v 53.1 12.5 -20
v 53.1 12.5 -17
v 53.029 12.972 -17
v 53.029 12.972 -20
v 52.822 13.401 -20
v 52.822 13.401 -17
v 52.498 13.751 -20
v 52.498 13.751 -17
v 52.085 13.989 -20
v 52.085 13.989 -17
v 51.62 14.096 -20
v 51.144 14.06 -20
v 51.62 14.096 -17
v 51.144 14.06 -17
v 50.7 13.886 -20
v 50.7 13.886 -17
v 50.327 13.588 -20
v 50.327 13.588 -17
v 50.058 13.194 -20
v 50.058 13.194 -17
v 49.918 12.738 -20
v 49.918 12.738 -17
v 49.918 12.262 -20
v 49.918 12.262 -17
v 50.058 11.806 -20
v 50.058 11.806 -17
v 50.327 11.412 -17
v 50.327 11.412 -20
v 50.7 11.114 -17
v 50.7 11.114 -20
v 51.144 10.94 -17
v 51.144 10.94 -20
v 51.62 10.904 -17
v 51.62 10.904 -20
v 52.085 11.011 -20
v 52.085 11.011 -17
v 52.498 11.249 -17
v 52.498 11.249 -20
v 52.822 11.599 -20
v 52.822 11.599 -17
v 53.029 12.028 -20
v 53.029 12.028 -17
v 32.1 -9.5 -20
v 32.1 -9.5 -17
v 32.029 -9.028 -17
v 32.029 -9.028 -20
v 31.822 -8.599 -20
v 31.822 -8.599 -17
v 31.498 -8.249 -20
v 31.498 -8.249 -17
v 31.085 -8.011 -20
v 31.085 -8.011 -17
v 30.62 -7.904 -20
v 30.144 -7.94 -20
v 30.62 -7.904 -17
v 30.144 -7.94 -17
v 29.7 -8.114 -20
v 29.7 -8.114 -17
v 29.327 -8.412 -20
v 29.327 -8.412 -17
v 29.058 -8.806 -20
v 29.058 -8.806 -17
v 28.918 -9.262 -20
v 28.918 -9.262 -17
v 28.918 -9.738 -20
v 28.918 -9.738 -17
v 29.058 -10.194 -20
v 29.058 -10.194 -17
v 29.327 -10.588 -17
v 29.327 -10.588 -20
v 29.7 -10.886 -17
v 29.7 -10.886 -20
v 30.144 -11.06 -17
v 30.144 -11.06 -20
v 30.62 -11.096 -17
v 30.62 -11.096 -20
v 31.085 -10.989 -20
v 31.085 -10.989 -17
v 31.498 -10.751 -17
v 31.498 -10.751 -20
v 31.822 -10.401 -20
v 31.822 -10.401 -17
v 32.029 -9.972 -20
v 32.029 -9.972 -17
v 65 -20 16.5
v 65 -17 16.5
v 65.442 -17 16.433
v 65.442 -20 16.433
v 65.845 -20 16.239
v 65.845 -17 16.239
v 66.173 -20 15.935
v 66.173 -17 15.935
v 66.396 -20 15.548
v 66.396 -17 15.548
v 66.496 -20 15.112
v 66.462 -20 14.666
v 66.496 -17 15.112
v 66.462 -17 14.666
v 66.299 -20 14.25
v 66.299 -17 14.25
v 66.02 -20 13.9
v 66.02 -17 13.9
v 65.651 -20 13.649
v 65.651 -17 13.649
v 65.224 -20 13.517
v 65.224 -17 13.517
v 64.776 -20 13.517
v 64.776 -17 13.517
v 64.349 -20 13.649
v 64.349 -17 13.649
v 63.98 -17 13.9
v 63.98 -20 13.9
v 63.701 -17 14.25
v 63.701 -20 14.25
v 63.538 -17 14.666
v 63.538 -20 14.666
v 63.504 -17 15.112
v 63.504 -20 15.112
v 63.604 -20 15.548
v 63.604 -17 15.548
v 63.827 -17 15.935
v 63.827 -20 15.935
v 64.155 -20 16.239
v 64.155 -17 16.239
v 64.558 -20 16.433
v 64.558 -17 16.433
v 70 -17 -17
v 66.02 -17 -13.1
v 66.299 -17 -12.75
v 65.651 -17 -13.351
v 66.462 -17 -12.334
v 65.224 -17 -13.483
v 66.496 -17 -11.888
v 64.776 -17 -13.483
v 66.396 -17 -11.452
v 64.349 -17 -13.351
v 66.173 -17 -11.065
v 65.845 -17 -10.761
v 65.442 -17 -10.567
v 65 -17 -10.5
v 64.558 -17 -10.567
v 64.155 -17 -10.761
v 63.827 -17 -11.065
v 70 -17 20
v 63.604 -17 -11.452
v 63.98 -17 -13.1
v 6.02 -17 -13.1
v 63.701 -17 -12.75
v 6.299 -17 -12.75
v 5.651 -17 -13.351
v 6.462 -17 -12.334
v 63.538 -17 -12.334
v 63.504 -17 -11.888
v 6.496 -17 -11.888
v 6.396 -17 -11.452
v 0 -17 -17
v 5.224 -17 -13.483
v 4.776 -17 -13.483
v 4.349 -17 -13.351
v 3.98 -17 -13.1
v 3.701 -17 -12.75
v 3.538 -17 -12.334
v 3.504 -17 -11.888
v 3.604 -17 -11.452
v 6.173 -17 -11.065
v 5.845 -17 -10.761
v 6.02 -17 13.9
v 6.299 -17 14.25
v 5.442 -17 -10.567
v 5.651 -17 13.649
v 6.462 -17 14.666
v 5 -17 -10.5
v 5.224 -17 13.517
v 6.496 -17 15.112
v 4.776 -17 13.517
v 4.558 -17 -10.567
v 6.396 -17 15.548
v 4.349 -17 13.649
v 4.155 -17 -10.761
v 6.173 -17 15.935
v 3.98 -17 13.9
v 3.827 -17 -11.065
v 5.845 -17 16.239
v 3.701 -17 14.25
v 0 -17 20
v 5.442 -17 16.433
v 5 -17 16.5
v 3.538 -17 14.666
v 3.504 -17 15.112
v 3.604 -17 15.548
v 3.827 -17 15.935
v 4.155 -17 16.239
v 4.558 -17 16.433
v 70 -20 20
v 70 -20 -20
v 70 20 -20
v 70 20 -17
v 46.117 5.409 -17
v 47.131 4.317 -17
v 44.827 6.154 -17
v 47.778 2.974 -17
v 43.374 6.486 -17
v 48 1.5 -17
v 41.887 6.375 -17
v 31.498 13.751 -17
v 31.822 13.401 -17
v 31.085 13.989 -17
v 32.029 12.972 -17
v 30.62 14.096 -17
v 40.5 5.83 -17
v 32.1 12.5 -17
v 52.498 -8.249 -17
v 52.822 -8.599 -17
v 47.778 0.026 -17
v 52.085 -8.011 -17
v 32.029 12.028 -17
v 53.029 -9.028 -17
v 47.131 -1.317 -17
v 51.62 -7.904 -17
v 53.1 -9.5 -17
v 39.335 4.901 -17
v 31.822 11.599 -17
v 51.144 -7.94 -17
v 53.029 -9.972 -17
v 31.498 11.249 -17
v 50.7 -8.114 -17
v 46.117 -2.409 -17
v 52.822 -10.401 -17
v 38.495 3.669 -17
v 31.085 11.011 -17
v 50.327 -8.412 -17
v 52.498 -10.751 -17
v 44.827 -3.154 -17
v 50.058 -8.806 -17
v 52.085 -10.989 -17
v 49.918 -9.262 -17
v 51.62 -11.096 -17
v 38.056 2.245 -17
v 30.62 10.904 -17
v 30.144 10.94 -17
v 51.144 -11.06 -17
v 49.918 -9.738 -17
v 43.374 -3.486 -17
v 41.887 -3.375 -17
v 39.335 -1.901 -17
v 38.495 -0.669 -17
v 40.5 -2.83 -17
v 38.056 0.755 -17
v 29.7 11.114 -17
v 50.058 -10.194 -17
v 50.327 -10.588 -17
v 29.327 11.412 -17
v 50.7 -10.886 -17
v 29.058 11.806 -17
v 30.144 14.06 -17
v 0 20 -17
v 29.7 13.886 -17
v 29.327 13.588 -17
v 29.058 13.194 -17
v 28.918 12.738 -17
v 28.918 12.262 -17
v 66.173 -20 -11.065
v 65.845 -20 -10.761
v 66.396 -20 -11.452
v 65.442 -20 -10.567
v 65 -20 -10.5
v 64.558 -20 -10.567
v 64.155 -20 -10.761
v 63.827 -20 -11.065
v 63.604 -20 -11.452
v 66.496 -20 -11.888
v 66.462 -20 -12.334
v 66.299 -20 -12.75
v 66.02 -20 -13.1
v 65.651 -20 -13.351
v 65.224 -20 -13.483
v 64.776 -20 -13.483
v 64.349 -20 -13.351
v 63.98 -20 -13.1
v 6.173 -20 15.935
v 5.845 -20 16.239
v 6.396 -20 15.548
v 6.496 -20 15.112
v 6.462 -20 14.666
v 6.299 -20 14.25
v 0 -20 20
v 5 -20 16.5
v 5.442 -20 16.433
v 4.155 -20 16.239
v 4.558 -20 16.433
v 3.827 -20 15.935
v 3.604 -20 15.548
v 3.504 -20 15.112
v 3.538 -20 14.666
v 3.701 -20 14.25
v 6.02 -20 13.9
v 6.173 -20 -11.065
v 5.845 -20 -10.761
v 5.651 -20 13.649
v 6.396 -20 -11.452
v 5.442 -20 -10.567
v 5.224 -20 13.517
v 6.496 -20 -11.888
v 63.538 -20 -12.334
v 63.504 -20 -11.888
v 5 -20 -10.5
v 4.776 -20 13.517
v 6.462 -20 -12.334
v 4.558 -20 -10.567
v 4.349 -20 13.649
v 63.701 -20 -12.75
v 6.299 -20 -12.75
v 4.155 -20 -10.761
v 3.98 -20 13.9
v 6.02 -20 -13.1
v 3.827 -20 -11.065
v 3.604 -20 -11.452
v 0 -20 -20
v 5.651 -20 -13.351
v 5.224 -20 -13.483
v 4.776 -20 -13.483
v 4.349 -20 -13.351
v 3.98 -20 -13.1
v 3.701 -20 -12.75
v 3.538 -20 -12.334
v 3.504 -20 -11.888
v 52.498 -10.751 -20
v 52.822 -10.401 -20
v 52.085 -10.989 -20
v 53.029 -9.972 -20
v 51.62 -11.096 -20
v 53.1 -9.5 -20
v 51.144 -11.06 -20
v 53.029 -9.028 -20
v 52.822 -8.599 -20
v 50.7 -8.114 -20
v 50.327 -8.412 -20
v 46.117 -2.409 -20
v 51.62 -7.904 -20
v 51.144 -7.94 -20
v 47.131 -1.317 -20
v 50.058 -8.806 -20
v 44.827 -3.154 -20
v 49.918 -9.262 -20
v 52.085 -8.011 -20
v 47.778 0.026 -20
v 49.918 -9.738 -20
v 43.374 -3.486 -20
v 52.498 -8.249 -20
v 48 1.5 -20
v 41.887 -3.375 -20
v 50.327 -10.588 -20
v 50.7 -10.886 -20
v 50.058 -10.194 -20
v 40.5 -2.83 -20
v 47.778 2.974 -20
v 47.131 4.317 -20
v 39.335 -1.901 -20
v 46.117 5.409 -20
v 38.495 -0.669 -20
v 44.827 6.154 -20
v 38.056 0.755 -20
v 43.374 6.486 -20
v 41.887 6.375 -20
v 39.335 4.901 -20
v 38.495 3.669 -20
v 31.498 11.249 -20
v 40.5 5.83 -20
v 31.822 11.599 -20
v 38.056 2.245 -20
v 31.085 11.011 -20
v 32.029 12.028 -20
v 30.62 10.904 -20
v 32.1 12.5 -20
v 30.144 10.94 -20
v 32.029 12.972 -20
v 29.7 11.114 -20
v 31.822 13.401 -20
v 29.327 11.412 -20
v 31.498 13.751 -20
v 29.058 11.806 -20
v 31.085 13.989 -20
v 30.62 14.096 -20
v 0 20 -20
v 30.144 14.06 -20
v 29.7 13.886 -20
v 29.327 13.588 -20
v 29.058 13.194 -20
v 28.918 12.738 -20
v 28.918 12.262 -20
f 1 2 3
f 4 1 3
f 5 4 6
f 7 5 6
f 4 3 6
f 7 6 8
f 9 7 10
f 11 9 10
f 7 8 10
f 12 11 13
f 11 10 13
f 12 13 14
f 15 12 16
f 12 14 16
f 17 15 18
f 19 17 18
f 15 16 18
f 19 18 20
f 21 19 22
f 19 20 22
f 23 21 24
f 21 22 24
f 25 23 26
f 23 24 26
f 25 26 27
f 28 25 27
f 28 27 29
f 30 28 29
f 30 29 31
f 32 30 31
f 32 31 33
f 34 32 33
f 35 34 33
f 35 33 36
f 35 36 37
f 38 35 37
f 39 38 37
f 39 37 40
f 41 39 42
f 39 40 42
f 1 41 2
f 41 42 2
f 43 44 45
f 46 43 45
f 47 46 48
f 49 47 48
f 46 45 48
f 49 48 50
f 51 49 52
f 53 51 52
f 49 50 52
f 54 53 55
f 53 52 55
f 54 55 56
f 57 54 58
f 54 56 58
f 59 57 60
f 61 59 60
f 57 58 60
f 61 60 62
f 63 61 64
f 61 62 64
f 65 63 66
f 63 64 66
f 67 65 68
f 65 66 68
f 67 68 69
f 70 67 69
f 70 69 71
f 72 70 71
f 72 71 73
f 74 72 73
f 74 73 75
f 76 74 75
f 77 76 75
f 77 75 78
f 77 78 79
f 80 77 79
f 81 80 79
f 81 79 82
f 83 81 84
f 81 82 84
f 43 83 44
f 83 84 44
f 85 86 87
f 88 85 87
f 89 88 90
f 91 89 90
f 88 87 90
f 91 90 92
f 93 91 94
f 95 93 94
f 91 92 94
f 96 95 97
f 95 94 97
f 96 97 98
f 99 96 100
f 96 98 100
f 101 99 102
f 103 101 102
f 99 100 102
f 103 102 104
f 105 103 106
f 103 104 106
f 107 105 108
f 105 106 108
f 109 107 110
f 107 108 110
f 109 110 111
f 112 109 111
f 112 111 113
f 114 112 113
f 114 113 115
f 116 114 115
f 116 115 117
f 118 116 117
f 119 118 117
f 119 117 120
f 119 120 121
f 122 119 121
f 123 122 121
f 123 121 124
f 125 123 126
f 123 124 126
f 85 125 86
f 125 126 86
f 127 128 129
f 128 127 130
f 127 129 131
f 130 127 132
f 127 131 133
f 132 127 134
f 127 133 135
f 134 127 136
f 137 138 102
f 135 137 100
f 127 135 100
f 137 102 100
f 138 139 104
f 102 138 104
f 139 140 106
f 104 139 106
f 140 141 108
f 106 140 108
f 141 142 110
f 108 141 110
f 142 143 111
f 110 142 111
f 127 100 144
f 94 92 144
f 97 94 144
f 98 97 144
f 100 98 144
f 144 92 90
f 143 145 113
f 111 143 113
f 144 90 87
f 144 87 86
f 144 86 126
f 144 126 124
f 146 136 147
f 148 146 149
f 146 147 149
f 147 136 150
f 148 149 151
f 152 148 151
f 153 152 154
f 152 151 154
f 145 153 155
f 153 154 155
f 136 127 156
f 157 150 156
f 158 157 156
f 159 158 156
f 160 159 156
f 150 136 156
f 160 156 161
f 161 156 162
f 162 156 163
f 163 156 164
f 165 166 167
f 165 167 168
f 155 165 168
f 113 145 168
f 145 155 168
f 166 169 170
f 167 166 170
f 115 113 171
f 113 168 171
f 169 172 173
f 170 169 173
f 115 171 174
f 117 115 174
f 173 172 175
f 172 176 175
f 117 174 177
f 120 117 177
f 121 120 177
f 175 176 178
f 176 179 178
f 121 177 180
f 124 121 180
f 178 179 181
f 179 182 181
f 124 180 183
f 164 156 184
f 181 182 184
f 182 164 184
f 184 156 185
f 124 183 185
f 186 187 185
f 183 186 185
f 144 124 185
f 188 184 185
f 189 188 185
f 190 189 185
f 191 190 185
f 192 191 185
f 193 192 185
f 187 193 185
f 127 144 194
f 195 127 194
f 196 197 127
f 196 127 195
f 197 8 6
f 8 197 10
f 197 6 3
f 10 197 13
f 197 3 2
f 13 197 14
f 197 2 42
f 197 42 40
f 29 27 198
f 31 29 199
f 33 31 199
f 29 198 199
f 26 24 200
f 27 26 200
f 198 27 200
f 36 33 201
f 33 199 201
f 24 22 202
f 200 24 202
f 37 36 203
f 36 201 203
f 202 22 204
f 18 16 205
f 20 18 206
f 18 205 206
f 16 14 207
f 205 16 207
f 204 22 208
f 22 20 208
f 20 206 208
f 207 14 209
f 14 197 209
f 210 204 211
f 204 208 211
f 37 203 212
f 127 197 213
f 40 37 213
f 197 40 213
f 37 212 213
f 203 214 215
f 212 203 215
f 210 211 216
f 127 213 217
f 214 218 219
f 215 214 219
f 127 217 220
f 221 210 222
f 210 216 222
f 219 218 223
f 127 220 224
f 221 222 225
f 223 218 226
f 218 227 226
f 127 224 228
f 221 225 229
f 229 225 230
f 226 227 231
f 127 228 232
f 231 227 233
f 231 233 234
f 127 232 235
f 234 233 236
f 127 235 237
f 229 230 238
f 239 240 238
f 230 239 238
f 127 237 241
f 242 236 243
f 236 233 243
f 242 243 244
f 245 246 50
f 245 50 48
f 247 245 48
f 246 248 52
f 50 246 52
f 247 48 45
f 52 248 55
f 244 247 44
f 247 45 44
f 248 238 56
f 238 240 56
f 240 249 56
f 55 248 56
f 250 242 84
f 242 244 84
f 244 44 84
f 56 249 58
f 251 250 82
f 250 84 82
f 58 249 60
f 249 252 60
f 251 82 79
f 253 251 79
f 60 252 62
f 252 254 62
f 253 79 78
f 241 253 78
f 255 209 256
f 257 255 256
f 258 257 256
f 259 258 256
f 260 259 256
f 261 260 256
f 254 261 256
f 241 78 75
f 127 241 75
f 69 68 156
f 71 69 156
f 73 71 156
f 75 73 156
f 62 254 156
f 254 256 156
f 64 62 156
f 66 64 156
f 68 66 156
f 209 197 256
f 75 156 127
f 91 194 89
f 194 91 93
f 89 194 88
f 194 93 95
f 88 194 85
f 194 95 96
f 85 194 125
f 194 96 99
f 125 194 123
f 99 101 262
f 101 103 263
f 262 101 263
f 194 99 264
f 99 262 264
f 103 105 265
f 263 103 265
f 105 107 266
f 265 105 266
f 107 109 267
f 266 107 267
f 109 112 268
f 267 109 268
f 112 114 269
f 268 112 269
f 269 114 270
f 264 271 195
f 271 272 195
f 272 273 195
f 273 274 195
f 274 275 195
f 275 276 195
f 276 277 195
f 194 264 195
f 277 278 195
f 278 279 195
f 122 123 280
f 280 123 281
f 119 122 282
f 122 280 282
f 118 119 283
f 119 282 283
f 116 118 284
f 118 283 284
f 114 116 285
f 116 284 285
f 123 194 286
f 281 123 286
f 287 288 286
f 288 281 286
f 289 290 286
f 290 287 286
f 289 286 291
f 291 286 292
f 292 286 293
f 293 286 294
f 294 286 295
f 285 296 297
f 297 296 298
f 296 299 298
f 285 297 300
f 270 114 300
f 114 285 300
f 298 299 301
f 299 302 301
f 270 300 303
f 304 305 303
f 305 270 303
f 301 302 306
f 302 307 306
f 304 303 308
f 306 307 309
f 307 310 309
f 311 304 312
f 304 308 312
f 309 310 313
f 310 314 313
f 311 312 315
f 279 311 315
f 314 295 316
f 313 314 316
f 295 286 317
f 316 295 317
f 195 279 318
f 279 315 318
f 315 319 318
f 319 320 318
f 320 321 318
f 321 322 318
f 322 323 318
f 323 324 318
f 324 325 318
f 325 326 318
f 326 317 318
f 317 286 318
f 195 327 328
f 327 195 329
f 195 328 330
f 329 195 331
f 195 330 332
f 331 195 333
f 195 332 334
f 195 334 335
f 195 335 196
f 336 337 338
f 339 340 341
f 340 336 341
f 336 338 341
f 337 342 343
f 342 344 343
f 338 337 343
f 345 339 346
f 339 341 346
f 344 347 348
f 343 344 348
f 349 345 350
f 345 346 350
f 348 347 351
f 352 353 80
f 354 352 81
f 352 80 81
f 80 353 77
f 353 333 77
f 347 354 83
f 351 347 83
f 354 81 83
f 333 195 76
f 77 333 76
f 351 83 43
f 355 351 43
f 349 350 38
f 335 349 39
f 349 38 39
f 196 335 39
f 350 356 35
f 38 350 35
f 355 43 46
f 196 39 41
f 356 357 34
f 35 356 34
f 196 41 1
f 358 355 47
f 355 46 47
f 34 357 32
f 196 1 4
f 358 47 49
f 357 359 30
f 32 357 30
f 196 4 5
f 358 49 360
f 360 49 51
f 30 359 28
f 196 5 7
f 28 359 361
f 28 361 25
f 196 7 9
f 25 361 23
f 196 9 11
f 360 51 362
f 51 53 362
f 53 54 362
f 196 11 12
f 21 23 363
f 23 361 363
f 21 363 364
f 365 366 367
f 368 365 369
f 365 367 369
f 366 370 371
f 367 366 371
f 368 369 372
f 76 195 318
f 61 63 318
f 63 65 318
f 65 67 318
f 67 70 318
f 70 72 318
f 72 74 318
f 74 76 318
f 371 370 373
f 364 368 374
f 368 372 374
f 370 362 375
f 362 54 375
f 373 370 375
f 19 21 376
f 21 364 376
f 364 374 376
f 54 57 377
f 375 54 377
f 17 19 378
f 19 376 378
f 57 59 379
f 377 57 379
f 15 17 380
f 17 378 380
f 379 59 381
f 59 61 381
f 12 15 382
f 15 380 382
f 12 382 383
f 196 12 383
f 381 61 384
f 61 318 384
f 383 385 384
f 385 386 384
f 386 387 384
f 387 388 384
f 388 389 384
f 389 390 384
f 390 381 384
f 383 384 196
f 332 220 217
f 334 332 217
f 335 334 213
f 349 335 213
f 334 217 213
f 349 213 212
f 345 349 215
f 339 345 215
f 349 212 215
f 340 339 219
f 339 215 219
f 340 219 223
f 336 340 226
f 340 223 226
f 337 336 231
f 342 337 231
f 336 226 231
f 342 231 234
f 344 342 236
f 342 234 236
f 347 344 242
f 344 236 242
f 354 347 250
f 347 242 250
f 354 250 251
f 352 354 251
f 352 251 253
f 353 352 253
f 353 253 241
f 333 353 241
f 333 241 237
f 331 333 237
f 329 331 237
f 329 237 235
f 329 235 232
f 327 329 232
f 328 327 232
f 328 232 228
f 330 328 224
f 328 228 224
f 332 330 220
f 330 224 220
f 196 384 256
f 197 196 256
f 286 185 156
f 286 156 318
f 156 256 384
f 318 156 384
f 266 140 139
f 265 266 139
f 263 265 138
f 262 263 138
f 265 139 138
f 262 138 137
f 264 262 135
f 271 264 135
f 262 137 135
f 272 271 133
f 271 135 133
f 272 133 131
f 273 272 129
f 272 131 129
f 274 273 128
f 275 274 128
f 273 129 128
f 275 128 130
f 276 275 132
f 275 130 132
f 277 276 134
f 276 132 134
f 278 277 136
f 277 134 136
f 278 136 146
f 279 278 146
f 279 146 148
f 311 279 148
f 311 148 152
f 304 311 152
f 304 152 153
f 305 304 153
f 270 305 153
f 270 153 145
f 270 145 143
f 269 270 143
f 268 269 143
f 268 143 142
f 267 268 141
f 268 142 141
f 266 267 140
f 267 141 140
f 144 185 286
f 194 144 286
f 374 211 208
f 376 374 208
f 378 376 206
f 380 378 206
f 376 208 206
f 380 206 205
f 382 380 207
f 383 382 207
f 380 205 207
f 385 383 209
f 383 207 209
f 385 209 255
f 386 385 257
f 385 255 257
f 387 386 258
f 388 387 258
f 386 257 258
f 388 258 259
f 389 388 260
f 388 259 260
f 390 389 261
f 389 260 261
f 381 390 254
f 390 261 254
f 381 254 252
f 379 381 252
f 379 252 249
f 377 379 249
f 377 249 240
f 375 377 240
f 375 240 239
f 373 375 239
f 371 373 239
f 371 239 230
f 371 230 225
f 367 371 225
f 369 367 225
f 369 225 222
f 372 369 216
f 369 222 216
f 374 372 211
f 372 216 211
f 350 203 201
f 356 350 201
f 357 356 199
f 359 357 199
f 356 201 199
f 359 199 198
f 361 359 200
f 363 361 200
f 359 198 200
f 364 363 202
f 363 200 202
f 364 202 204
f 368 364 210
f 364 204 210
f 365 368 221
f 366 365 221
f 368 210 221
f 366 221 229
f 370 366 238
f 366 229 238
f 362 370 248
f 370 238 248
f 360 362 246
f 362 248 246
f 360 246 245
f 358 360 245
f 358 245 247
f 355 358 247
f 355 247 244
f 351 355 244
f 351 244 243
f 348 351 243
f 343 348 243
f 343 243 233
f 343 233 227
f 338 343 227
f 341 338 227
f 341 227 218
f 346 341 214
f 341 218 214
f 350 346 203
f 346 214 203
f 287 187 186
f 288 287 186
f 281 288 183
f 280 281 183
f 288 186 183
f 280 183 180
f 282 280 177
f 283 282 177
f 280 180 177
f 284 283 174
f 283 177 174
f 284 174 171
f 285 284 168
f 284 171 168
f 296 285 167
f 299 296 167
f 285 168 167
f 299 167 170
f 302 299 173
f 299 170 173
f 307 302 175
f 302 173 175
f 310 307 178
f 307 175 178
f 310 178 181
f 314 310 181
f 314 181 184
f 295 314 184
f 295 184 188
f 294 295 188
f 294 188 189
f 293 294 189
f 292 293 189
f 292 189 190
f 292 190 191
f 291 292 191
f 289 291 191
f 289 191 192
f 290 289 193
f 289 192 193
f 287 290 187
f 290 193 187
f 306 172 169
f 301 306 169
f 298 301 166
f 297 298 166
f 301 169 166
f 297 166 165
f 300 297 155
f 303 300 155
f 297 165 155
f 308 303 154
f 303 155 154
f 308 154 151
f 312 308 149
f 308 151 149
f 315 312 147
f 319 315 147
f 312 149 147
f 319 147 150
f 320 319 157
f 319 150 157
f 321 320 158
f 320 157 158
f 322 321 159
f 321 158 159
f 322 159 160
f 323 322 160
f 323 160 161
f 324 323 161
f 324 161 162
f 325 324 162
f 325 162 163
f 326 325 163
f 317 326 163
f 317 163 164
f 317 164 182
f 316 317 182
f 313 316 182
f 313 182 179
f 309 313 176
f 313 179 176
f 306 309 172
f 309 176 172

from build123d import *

# Parameters (mm, degrees)
EXTRUDE_1_DEPTH     = 70
SKETCH_2_R          = 5
SKETCH_2_R_2        = 1.6
CUT_EXTRUDE_1_DEPTH = 3
SKETCH_3_R          = 1.5
CUT_EXTRUDE_2_DEPTH = 3


with BuildPart() as part:
    # Эскиз1 → Бобышка-Вытянуть1 (new body)
    with BuildSketch(Plane(origin=(0, 0, 0), x_dir=(0, 0, -1), z_dir=(1, 0, 0))):
        Polygon((17, -17), (-20, -17), (-20, -20), (20, -20), (20, 20), (17, 20), align=None)
    extrude(amount=EXTRUDE_1_DEPTH)

    # Эскиз2 → Вырез-Вытянуть1 (cut)
    with BuildSketch(Plane.XY.offset(-17)):
        with Locations((43, 1.5)):
            Circle(SKETCH_2_R)
        with Locations((51.5, 12.5)):
            Circle(SKETCH_2_R_2)
        with Locations((30.5, 12.5)):
            Circle(SKETCH_2_R_2)
        with Locations((30.5, -9.5)):
            Circle(SKETCH_2_R_2)
        with Locations((51.5, -9.5)):
            Circle(SKETCH_2_R_2)
    extrude(amount=-CUT_EXTRUDE_1_DEPTH, mode=Mode.SUBTRACT)

    # Эскиз3 → Вырез-Вытянуть2 (cut)
    with BuildSketch(Plane(origin=(0, -17, 0), x_dir=(1, 0, 0), z_dir=(0, 1, 0))):
        with Locations(Location((65, -15, 0), (0, 0, 270))):
            Circle(SKETCH_3_R)
        with Locations(Location((65, 12, 0), (0, 0, 270))):
            Circle(SKETCH_3_R)
        with Locations(Location((5, -15, 0), (0, 0, 270))):
            Circle(SKETCH_3_R)
        with Locations(Location((5, 12, 0), (0, 0, 270))):
            Circle(SKETCH_3_R)
    extrude(amount=-CUT_EXTRUDE_2_DEPTH, mode=Mode.SUBTRACT)


solid = part.part
